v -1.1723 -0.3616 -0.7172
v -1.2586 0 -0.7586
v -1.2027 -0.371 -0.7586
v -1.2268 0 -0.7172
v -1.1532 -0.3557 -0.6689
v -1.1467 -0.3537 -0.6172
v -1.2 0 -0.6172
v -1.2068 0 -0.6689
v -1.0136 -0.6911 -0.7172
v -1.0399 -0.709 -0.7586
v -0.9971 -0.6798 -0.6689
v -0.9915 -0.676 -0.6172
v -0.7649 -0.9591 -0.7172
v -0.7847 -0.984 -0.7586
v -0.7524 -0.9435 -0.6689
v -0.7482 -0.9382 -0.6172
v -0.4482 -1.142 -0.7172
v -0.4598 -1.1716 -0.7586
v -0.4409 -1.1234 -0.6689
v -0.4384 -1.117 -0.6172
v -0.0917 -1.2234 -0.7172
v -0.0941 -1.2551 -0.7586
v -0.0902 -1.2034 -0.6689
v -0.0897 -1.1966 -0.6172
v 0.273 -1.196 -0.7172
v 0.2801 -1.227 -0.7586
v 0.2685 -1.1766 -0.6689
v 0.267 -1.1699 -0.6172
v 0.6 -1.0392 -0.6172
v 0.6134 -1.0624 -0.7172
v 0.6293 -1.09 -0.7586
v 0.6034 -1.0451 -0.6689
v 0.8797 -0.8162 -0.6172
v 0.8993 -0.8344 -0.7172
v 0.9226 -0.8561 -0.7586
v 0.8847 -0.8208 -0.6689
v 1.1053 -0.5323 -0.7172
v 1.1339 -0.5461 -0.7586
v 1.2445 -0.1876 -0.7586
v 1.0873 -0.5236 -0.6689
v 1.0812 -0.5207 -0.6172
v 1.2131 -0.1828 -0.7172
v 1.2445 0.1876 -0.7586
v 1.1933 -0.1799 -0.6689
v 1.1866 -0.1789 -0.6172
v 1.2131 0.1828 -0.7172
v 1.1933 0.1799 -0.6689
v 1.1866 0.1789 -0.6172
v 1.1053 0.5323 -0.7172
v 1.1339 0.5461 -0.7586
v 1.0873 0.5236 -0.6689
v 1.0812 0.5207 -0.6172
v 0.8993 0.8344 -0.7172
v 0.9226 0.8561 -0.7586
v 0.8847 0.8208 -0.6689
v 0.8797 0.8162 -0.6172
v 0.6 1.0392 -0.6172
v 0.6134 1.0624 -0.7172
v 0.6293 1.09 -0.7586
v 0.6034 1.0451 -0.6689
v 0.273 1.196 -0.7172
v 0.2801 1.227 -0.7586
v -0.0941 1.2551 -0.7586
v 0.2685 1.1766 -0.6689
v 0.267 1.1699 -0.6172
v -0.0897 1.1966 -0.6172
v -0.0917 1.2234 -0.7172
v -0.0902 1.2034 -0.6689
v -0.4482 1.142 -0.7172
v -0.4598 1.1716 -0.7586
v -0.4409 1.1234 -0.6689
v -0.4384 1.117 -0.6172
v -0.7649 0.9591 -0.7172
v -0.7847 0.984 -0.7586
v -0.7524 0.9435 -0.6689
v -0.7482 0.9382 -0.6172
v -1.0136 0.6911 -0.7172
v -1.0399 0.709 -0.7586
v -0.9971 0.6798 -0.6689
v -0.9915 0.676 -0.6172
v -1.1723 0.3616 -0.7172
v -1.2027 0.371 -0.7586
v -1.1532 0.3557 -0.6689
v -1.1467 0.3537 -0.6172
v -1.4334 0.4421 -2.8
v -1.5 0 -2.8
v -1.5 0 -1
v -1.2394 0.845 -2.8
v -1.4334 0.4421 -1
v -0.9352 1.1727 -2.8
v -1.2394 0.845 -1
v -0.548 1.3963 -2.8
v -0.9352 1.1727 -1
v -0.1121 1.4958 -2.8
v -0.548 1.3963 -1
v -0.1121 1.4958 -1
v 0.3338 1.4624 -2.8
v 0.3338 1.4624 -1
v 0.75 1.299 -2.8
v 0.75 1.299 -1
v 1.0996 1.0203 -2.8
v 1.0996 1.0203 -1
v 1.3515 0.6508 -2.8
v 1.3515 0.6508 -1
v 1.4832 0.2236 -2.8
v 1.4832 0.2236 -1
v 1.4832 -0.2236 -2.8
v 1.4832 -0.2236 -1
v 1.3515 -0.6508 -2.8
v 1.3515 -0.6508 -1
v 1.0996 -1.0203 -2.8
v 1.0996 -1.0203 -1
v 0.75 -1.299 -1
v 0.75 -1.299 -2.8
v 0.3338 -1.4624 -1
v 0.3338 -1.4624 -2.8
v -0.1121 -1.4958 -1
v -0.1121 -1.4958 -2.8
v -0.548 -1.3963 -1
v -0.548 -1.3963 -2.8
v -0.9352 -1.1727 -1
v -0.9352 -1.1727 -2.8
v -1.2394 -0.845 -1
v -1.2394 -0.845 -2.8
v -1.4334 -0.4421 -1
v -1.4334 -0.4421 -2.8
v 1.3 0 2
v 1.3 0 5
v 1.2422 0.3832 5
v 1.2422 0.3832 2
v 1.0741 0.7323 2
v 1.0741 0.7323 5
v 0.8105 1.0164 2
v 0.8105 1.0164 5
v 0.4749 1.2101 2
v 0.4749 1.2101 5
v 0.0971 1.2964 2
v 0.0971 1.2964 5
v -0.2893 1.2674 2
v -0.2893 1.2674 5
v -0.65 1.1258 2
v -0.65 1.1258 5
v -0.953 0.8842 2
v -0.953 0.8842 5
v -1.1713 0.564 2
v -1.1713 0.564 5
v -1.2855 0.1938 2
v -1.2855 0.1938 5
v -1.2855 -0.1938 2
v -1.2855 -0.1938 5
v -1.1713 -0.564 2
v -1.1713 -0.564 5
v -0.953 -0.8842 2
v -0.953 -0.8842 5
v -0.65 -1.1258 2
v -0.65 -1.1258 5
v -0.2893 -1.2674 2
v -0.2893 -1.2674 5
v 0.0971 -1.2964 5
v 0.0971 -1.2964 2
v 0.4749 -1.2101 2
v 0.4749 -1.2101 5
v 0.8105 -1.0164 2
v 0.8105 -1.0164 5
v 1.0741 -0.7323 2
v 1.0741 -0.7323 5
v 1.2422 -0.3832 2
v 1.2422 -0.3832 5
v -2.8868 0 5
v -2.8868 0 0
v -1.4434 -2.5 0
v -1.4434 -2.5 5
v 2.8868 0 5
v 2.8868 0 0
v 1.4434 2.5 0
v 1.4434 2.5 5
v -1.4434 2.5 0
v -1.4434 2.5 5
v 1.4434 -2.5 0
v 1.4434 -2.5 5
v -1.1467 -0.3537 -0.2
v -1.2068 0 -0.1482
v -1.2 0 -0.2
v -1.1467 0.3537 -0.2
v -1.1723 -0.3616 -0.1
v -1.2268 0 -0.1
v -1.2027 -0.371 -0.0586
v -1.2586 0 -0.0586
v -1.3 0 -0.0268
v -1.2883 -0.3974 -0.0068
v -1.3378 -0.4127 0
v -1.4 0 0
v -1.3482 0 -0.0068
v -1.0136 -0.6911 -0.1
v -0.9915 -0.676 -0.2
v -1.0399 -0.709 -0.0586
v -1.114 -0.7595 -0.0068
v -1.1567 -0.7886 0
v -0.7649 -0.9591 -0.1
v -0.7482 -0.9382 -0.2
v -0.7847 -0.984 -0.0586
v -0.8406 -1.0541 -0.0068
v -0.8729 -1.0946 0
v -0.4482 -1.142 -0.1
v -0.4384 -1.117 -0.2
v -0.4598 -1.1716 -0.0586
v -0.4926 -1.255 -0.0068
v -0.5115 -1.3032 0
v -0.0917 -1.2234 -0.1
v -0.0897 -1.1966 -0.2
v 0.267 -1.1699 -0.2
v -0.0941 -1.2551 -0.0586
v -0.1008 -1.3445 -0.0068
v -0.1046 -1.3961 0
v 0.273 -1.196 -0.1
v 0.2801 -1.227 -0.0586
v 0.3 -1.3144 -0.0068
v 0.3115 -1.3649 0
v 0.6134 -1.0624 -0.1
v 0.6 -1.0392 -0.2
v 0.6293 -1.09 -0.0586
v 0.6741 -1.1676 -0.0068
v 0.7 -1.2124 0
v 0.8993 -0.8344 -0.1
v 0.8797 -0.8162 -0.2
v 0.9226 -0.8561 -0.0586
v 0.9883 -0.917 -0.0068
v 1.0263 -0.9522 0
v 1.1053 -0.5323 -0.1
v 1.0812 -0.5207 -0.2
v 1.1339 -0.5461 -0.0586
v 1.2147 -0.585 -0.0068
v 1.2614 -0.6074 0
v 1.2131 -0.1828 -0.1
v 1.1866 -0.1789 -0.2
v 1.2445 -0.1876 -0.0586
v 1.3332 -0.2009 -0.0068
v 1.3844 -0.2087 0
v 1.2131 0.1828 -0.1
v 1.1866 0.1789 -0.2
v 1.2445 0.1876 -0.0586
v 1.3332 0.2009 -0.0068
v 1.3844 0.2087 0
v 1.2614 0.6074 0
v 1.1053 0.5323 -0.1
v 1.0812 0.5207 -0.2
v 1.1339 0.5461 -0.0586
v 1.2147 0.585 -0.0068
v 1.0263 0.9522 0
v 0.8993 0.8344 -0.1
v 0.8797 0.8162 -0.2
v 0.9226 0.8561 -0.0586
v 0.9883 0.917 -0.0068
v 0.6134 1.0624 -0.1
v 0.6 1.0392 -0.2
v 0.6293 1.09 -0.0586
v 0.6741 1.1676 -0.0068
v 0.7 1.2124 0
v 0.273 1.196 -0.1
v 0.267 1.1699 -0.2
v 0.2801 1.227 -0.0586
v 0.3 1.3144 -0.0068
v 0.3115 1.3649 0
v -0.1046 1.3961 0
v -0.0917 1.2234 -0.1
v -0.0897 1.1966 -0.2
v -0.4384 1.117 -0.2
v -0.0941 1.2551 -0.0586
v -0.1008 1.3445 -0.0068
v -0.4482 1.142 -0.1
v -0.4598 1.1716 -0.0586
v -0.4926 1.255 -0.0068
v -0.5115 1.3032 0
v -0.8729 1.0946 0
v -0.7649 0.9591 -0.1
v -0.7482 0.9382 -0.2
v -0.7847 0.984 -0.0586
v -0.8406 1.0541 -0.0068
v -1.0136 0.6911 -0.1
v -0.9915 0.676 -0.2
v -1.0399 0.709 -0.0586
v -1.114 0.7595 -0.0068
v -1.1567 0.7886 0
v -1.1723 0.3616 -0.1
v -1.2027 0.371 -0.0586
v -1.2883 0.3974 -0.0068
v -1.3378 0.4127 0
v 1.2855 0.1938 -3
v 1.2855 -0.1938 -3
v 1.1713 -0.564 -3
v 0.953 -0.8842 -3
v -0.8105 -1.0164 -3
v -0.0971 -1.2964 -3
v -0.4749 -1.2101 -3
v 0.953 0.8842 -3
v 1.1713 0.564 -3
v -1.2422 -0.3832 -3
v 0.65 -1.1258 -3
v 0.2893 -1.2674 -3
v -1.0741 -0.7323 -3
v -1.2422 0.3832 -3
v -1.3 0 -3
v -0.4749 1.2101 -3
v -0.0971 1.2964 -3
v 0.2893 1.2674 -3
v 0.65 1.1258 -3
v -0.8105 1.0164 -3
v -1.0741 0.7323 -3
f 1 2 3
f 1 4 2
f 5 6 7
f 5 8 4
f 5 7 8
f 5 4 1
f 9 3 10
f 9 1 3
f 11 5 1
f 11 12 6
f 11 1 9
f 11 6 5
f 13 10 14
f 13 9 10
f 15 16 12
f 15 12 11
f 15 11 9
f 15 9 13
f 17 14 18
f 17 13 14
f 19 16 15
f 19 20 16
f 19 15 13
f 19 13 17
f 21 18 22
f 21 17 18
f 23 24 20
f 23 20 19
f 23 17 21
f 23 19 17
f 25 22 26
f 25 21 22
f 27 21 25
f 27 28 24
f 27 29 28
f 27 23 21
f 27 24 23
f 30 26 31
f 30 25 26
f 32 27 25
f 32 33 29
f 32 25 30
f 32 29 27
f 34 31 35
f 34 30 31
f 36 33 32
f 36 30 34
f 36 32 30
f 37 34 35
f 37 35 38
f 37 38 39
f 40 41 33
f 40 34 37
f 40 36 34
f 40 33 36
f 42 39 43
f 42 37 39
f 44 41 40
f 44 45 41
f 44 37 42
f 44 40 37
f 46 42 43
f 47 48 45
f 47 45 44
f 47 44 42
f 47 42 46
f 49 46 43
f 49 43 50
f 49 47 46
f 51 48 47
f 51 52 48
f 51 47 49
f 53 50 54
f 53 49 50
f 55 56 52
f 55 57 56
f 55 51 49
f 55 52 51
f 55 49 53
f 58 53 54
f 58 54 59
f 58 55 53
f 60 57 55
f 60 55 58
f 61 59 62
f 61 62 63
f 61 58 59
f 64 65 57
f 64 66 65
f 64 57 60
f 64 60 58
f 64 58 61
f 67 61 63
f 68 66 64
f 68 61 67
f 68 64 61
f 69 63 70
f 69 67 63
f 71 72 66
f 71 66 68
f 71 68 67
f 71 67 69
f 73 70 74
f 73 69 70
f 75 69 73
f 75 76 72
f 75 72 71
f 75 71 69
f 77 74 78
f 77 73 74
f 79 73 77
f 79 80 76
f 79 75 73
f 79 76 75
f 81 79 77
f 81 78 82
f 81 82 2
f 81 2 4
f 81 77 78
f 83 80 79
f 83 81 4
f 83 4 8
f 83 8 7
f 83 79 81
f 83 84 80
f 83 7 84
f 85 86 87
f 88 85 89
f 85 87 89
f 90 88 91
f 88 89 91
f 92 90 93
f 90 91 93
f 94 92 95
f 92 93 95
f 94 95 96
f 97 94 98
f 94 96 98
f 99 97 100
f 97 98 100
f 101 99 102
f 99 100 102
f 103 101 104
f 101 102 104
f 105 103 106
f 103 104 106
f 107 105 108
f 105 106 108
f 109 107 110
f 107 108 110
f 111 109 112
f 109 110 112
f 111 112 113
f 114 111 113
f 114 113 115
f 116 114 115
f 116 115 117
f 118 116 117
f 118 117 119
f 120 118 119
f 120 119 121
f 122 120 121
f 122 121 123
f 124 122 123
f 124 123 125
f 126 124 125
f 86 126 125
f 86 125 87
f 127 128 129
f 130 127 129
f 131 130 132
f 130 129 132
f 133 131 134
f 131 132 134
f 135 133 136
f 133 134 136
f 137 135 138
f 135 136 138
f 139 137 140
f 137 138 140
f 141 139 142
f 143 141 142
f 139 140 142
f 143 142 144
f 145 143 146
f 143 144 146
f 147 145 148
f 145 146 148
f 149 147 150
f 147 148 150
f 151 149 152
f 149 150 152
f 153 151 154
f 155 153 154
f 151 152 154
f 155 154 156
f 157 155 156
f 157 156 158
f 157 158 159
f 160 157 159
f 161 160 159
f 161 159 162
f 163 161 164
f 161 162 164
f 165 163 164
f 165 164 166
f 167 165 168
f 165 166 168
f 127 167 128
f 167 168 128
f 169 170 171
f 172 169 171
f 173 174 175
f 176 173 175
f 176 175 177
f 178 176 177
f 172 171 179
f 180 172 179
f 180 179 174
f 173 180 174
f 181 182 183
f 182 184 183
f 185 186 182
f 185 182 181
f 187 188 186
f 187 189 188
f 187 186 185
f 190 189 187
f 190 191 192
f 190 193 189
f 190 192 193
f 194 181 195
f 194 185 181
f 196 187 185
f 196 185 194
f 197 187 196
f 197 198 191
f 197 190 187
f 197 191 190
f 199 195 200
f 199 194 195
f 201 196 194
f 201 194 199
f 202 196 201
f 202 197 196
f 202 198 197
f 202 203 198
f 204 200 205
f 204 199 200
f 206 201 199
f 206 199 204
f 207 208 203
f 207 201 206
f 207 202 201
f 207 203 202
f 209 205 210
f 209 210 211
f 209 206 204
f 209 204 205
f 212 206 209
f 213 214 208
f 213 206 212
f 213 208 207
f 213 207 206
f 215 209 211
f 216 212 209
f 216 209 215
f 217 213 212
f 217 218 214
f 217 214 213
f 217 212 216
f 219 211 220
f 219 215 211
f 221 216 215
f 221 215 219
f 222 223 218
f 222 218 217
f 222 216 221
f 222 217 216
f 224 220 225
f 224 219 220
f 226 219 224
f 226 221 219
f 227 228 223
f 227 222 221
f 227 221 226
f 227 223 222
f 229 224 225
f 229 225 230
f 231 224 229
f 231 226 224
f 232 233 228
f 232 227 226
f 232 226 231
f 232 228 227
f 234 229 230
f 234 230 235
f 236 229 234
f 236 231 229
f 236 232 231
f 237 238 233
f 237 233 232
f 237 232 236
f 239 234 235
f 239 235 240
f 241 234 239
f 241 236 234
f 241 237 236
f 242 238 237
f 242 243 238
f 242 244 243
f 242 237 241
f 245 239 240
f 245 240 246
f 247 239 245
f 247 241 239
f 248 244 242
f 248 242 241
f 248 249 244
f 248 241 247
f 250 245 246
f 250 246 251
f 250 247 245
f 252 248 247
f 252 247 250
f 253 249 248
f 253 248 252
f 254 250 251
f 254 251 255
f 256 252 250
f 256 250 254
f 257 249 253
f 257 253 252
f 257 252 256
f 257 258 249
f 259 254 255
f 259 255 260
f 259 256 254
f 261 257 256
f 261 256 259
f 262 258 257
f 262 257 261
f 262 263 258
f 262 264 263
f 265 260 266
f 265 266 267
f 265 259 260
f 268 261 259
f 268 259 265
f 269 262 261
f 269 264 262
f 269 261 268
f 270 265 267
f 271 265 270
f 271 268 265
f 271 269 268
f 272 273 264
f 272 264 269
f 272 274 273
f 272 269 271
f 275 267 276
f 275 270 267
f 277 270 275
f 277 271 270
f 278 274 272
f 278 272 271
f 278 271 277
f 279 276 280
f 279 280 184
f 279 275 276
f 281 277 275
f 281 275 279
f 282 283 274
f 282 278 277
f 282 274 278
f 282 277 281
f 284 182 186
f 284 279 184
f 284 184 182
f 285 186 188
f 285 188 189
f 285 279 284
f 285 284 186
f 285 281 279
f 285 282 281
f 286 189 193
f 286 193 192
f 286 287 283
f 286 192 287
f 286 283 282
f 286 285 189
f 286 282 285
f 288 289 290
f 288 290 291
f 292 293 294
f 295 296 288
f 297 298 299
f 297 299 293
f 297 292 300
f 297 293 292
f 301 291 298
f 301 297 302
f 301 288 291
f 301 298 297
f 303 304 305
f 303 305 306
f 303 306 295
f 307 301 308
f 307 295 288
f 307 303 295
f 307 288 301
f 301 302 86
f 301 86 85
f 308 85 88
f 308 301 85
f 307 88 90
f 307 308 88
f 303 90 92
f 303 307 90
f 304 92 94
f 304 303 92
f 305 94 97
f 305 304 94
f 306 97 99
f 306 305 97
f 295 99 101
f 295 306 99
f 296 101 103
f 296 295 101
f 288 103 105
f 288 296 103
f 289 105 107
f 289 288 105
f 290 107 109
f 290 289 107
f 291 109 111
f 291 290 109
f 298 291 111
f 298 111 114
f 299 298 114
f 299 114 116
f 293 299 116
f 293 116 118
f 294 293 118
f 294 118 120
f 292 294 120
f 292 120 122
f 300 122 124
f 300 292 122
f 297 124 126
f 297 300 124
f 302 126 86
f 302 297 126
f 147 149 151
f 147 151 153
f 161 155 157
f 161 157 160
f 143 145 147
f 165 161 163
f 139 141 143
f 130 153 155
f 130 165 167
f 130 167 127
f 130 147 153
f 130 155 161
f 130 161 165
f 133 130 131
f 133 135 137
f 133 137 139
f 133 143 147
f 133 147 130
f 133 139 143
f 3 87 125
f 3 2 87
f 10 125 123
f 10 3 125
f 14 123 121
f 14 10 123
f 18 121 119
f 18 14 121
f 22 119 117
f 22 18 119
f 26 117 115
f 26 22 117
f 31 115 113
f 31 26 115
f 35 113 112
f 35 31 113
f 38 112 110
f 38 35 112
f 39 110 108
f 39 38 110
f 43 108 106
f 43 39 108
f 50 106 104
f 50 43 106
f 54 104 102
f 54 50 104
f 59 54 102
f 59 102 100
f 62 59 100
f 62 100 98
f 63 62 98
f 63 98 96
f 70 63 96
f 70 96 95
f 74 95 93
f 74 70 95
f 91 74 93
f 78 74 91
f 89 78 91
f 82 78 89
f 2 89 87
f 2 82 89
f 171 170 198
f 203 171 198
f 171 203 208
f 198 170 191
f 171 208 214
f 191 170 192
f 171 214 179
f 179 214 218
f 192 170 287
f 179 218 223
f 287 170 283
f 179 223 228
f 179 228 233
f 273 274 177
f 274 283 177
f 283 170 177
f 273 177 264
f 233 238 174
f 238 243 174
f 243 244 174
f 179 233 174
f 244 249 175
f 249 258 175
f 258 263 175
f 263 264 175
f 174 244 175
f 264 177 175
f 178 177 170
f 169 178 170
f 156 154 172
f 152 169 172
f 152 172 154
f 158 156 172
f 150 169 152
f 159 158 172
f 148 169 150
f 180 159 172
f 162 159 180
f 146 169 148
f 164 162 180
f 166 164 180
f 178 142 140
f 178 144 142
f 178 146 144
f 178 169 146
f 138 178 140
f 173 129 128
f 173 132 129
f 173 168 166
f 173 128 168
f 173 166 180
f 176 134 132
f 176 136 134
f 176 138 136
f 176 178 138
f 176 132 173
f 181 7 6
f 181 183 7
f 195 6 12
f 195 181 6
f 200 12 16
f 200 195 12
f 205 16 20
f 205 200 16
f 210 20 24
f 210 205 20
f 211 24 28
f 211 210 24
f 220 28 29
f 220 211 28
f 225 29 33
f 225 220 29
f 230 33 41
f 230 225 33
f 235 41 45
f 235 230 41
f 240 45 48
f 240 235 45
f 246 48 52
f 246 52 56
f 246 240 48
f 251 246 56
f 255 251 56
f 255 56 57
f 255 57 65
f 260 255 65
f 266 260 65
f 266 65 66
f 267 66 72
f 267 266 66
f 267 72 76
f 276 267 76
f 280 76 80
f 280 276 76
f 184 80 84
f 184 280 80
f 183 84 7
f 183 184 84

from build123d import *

# Parameters (mm, degrees)
EXTRUSION1_DEPTH        = 5
ESQUISSE2_R             = 1.5
EXTRUSION2_DEPTH        = 3
CHANFREIN1_SIZE         = 0.2
ESQUISSE3_R             = 1.3
ENL_V_MAT_EXTRU_1_DEPTH = 3


with BuildPart() as part:
    # Esquisse1 → Extrusion1 (new body)
    with BuildSketch(Plane.XY):
        Polygon((1.443375673, 2.5), (-1.443375673, 2.5), (-2.886751346, 0), (-1.443375673, -2.5), (1.443375673, -2.5), (2.886751346, 0), align=None)
    extrude(amount=EXTRUSION1_DEPTH)

    # Esquisse2 → Extrusion2 (add)
    with BuildSketch(Plane(origin=(0, 0, 0), x_dir=(-1, 0, 0), z_dir=(0, 0, -1))):
        Circle(ESQUISSE2_R)
    extrude(amount=EXTRUSION2_DEPTH)

    # Chanfrein1
    chanfrein1_edges = [part.edges().sort_by_distance(p)[0] for p in [
        (1.5, 0, -3),
    ]]
    chamfer(chanfrein1_edges, length=CHANFREIN1_SIZE)

    # Esquisse3 → Enlèv. mat.-Extru.1 (cut)
    with BuildSketch(Plane.XY.offset(5)):
        Circle(ESQUISSE3_R)
    extrude(amount=-ENL_V_MAT_EXTRU_1_DEPTH, mode=Mode.SUBTRACT)

    # Esquisse4 → Enlèvement de matière-Révolution1 (revolve, cut)
    with BuildSketch(Plane(origin=(0, 0, 0), x_dir=(1, 0, 0), z_dir=(0, 1, 0)), mode=Mode.PRIVATE) as enl_vement_de_mati_re_r_volution1_sk:
        with BuildLine():
            Line((1.2, 0.617157288), (1.2, 0.2))
            ThreePointArc((1.2, 0.2), (1.258578644, 0.058578644), (1.4, 0))
            Line((1.4, 0), (1.804772915, 0))
            Line((1.804772915, 0), (1.804772915, 1.304772915))
            Line((1.804772915, 1.304772915), (1.258578644, 0.758578644))
            ThreePointArc((1.258578644, 0.758578644), (1.215224093, 0.693693974), (1.2, 0.617157288))
        make_face()
    revolve(enl_vement_de_mati_re_r_volution1_sk.sketch.rotate(Axis((0, 0, -4.374841009), (0, 0, 1)), 180), axis=Axis((0, 0, -4.374841009), (0, 0, 1)), mode=Mode.SUBTRACT)


solid = part.part
